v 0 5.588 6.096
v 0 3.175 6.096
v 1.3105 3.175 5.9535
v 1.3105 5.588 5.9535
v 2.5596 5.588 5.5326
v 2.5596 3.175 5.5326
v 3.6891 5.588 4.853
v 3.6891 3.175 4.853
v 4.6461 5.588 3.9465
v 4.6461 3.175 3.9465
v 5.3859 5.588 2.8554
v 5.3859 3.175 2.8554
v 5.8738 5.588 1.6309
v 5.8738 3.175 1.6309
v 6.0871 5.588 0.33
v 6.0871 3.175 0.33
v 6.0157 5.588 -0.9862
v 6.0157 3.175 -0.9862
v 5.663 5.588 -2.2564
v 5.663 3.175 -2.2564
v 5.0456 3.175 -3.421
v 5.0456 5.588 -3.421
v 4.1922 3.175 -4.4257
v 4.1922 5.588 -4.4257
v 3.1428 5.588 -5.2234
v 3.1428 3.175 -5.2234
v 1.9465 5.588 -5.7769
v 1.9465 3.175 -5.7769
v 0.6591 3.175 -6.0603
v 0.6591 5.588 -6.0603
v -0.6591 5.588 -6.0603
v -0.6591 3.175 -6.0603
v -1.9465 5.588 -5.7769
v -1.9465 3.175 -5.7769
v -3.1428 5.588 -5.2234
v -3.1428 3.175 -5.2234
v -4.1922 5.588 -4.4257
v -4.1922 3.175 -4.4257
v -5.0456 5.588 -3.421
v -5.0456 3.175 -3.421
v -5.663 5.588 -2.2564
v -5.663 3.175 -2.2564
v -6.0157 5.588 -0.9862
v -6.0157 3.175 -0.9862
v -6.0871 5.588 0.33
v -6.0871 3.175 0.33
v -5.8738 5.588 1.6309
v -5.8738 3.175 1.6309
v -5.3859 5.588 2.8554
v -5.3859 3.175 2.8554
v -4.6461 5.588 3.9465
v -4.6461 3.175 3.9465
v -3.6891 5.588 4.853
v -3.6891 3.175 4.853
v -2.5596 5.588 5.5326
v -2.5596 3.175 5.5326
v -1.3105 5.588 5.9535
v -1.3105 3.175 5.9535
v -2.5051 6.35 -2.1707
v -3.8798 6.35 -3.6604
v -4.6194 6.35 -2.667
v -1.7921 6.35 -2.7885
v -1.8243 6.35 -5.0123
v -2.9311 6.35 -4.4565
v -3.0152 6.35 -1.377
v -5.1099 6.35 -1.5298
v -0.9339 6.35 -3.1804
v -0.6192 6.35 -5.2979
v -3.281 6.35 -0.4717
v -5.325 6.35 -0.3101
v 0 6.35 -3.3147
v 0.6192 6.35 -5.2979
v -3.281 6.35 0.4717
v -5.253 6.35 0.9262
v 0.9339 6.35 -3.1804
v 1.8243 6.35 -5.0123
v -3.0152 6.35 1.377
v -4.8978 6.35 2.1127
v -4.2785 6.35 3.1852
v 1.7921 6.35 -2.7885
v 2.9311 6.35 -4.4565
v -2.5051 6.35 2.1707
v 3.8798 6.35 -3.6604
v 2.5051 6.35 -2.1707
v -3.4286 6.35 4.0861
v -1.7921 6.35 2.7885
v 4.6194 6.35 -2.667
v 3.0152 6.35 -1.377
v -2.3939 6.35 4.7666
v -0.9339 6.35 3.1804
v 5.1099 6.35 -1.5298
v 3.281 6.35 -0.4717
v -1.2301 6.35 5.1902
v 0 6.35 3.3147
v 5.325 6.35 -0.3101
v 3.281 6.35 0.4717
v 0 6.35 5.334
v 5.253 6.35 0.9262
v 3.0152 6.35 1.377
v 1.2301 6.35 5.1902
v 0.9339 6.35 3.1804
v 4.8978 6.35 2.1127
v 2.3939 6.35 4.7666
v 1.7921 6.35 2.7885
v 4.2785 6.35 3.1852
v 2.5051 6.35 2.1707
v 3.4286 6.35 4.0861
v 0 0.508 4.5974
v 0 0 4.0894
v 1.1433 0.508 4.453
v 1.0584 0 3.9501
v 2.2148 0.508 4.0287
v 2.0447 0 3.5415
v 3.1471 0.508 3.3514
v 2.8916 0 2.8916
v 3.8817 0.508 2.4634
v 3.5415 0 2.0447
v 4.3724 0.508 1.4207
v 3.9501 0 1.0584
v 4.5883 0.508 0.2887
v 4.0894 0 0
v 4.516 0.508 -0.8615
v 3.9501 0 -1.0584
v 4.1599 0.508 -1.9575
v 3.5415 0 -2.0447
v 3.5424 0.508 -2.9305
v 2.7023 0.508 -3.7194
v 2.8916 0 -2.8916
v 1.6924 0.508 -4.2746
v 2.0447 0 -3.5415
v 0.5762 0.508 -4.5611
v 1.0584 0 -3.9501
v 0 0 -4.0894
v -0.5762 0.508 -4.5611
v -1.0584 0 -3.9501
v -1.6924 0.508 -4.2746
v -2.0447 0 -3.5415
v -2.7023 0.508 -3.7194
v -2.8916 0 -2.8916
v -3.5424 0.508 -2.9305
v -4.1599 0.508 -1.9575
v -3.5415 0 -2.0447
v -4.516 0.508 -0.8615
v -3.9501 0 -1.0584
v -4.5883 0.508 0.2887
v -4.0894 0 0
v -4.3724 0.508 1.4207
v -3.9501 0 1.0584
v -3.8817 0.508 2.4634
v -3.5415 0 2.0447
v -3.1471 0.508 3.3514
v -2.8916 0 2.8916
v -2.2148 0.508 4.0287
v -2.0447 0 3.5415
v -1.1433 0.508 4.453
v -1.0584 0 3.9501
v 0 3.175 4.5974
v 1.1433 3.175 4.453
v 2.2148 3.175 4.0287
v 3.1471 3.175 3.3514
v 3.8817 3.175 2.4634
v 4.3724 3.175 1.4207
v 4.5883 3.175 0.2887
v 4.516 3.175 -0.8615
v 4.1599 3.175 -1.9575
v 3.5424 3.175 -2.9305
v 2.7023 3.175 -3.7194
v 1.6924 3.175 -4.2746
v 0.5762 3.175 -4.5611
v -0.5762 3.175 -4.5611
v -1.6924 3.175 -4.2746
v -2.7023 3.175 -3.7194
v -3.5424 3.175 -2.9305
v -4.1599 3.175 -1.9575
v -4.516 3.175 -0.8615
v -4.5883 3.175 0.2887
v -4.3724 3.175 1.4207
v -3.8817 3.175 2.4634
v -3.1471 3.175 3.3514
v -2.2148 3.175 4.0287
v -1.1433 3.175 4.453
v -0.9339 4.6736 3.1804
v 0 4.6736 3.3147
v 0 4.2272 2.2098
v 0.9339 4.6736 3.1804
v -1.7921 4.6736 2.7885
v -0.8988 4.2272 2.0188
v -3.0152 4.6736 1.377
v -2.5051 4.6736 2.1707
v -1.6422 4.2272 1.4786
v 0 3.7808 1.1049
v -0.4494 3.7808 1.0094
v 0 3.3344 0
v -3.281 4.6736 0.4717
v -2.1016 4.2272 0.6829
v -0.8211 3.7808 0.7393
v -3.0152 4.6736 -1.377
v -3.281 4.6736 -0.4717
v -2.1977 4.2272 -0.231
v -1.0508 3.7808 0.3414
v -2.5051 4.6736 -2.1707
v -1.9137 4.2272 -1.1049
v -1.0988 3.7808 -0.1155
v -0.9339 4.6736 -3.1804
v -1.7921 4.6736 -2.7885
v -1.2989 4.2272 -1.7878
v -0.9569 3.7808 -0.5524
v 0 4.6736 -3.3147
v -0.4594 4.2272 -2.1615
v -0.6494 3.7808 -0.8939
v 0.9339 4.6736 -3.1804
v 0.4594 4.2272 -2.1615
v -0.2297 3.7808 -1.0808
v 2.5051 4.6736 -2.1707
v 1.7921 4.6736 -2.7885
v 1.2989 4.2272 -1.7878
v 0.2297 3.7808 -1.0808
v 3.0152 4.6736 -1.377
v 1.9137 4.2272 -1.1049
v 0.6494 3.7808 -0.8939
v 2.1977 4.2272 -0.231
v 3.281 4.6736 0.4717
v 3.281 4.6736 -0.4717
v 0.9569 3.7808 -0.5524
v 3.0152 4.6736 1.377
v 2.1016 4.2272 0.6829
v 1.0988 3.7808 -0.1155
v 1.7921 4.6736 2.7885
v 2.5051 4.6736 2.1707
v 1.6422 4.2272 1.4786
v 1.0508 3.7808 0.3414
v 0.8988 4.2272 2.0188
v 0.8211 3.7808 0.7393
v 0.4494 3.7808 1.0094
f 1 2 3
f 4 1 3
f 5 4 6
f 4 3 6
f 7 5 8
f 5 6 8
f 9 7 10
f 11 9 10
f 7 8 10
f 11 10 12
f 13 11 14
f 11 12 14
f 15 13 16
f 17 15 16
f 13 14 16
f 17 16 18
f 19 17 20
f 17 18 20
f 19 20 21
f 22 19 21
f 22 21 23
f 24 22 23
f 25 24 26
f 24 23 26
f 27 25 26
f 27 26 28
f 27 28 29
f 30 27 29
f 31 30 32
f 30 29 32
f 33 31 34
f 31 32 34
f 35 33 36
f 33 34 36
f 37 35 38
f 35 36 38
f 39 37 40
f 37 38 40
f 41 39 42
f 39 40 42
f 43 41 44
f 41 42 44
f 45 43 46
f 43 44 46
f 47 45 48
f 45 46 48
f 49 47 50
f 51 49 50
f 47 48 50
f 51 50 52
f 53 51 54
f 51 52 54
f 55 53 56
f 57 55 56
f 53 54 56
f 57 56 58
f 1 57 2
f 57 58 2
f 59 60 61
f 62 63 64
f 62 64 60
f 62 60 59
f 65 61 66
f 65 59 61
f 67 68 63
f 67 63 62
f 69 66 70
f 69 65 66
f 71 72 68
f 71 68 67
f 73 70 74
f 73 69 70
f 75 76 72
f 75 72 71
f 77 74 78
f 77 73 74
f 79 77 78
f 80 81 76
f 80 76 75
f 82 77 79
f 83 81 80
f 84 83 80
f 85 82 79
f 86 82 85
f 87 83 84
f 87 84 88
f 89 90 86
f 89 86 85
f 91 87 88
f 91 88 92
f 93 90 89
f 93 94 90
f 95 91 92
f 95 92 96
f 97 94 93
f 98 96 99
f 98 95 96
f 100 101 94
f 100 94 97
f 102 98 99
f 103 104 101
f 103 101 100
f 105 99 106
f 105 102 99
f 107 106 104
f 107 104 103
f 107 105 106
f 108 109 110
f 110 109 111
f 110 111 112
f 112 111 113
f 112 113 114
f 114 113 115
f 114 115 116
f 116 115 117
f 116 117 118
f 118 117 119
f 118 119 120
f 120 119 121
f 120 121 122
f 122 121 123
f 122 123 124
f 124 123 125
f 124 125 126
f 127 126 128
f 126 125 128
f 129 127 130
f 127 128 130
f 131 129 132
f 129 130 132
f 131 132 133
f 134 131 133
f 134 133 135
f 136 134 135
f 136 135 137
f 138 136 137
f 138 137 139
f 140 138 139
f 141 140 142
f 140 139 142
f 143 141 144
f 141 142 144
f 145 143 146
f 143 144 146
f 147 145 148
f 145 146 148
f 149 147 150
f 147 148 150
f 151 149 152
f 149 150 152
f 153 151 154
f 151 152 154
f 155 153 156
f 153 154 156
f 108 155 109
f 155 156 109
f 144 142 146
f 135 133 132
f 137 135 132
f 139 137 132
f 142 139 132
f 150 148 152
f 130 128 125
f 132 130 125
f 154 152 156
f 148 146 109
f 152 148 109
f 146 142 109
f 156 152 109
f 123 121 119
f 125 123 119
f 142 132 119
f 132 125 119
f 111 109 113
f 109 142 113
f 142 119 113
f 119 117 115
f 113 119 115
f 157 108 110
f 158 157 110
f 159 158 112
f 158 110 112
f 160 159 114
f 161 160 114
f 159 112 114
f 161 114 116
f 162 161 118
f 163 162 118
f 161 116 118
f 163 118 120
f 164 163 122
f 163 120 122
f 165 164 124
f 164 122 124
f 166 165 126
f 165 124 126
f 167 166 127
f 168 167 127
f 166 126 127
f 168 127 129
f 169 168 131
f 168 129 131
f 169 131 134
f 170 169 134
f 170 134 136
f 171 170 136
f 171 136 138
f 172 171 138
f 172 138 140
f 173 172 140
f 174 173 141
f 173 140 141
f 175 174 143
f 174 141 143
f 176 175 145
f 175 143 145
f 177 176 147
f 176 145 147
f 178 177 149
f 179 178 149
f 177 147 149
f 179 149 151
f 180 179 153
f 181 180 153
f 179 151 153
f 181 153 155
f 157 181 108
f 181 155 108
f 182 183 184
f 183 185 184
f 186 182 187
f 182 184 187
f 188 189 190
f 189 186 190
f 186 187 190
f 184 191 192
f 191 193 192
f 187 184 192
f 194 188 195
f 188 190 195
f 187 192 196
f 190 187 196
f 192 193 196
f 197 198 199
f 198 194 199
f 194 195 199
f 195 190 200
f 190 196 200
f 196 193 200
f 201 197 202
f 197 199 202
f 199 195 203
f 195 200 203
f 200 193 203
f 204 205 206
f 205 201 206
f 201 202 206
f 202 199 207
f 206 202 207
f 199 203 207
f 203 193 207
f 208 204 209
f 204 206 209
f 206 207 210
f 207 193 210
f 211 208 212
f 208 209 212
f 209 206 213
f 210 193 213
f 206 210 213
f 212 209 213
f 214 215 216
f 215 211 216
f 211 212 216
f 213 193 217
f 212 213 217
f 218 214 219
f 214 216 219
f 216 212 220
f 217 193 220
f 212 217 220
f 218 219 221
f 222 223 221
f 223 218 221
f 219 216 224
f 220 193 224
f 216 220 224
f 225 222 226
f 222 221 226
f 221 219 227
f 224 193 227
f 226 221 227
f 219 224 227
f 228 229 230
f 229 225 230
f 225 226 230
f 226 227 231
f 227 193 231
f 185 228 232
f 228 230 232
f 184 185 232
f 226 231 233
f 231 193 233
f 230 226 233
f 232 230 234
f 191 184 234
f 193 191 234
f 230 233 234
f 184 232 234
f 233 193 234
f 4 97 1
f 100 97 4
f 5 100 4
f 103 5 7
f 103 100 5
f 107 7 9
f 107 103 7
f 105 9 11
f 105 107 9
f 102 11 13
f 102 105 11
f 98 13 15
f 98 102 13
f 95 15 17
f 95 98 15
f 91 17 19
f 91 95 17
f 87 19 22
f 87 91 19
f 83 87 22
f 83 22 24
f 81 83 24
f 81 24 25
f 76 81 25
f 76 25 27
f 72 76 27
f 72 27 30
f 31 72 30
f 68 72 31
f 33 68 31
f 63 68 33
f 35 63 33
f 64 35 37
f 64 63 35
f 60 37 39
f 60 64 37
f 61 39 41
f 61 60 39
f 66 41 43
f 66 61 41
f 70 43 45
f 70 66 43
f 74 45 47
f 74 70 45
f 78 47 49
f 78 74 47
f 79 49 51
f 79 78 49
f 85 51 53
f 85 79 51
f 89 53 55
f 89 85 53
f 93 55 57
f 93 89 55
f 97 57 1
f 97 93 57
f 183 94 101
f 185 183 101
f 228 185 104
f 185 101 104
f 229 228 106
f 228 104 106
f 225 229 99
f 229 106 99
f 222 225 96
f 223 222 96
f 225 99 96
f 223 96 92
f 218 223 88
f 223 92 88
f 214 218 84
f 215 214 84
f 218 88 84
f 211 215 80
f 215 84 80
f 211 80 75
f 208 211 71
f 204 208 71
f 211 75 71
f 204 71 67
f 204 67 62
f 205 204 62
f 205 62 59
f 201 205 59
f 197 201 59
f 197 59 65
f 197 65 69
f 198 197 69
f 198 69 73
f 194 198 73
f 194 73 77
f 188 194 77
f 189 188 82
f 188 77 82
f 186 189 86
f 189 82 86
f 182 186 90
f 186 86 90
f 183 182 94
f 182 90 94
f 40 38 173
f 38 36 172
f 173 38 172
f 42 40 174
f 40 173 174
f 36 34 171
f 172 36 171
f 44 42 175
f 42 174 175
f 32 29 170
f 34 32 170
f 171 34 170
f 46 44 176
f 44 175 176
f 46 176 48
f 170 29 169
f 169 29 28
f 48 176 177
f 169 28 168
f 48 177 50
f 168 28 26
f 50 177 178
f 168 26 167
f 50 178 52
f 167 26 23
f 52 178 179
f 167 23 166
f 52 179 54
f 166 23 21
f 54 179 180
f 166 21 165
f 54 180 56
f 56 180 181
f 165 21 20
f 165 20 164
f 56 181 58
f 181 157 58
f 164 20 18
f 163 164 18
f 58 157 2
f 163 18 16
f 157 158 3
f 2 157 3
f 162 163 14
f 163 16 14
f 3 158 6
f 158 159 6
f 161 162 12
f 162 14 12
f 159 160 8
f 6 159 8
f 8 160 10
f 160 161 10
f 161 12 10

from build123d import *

# Parameters (mm, degrees)
SKETCH1_R           = 4.5974
BOSS_EXTRUDE1_DEPTH = 3.175
SKETCH2_R           = 6.096
BOSS_EXTRUDE2_DEPTH = 3.175
CHAMFER1_SIZE       = 0.762
CHAMFER2_SIZE       = 0.508
SKETCH3_R           = 3.3147
CUT_EXTRUDE1_DEPTH  = 1.6764


with BuildPart() as part:
    # Sketch1 → Boss-Extrude1 (new body)
    with BuildSketch(Plane(origin=(0, 0, 0), x_dir=(1, 0, 0), z_dir=(0, 1, 0))):
        with Locations(Location((0, 0, 0), (0, 0, 270))):
            Circle(SKETCH1_R)
    extrude(amount=BOSS_EXTRUDE1_DEPTH)

    # Sketch2 → Boss-Extrude2 (add)
    with BuildSketch(Plane(origin=(0, 3.175, 0), x_dir=(1, 0, 0), z_dir=(0, 1, 0))):
        with Locations(Location((0, 0, 0), (0, 0, 270))):
            Circle(SKETCH2_R)
    extrude(amount=BOSS_EXTRUDE2_DEPTH)

    # Chamfer1
    chamfer1_edges = [part.edges().sort_by_distance(p)[0] for p in [
        (0, 6.35, -6.096),
    ]]
    chamfer(chamfer1_edges, length=CHAMFER1_SIZE)

    # Chamfer2
    chamfer2_edges = [part.edges().sort_by_distance(p)[0] for p in [
        (0, 0, -4.5974),
    ]]
    chamfer(chamfer2_edges, length=CHAMFER2_SIZE)

    # Sketch3 → Cut-Extrude1 (cut)
    with BuildSketch(Plane(origin=(0, 6.35, 0), x_dir=(1, 0, 0), z_dir=(0, 1, 0))):
        with Locations(Location((0, 0, 0), (0, 0, 270))):
            Circle(SKETCH3_R)
    extrude(amount=-CUT_EXTRUDE1_DEPTH, mode=Mode.SUBTRACT)

    # Cut-Extrude2 cone 1 section (through the dimple's axis) → Cut-Extrude2 (revolve, cut)
    with BuildSketch(Plane(origin=(0, 4.6736, 0), x_dir=(0, 0, 1), z_dir=(1, 0, 0))):
        Polygon((0, 0), (3.3147, 0), (0, 1.339225731), align=None)
    revolve(axis=Axis((0, 4.6736, 0), (0, -1, 0)), mode=Mode.SUBTRACT)


solid = part.part
